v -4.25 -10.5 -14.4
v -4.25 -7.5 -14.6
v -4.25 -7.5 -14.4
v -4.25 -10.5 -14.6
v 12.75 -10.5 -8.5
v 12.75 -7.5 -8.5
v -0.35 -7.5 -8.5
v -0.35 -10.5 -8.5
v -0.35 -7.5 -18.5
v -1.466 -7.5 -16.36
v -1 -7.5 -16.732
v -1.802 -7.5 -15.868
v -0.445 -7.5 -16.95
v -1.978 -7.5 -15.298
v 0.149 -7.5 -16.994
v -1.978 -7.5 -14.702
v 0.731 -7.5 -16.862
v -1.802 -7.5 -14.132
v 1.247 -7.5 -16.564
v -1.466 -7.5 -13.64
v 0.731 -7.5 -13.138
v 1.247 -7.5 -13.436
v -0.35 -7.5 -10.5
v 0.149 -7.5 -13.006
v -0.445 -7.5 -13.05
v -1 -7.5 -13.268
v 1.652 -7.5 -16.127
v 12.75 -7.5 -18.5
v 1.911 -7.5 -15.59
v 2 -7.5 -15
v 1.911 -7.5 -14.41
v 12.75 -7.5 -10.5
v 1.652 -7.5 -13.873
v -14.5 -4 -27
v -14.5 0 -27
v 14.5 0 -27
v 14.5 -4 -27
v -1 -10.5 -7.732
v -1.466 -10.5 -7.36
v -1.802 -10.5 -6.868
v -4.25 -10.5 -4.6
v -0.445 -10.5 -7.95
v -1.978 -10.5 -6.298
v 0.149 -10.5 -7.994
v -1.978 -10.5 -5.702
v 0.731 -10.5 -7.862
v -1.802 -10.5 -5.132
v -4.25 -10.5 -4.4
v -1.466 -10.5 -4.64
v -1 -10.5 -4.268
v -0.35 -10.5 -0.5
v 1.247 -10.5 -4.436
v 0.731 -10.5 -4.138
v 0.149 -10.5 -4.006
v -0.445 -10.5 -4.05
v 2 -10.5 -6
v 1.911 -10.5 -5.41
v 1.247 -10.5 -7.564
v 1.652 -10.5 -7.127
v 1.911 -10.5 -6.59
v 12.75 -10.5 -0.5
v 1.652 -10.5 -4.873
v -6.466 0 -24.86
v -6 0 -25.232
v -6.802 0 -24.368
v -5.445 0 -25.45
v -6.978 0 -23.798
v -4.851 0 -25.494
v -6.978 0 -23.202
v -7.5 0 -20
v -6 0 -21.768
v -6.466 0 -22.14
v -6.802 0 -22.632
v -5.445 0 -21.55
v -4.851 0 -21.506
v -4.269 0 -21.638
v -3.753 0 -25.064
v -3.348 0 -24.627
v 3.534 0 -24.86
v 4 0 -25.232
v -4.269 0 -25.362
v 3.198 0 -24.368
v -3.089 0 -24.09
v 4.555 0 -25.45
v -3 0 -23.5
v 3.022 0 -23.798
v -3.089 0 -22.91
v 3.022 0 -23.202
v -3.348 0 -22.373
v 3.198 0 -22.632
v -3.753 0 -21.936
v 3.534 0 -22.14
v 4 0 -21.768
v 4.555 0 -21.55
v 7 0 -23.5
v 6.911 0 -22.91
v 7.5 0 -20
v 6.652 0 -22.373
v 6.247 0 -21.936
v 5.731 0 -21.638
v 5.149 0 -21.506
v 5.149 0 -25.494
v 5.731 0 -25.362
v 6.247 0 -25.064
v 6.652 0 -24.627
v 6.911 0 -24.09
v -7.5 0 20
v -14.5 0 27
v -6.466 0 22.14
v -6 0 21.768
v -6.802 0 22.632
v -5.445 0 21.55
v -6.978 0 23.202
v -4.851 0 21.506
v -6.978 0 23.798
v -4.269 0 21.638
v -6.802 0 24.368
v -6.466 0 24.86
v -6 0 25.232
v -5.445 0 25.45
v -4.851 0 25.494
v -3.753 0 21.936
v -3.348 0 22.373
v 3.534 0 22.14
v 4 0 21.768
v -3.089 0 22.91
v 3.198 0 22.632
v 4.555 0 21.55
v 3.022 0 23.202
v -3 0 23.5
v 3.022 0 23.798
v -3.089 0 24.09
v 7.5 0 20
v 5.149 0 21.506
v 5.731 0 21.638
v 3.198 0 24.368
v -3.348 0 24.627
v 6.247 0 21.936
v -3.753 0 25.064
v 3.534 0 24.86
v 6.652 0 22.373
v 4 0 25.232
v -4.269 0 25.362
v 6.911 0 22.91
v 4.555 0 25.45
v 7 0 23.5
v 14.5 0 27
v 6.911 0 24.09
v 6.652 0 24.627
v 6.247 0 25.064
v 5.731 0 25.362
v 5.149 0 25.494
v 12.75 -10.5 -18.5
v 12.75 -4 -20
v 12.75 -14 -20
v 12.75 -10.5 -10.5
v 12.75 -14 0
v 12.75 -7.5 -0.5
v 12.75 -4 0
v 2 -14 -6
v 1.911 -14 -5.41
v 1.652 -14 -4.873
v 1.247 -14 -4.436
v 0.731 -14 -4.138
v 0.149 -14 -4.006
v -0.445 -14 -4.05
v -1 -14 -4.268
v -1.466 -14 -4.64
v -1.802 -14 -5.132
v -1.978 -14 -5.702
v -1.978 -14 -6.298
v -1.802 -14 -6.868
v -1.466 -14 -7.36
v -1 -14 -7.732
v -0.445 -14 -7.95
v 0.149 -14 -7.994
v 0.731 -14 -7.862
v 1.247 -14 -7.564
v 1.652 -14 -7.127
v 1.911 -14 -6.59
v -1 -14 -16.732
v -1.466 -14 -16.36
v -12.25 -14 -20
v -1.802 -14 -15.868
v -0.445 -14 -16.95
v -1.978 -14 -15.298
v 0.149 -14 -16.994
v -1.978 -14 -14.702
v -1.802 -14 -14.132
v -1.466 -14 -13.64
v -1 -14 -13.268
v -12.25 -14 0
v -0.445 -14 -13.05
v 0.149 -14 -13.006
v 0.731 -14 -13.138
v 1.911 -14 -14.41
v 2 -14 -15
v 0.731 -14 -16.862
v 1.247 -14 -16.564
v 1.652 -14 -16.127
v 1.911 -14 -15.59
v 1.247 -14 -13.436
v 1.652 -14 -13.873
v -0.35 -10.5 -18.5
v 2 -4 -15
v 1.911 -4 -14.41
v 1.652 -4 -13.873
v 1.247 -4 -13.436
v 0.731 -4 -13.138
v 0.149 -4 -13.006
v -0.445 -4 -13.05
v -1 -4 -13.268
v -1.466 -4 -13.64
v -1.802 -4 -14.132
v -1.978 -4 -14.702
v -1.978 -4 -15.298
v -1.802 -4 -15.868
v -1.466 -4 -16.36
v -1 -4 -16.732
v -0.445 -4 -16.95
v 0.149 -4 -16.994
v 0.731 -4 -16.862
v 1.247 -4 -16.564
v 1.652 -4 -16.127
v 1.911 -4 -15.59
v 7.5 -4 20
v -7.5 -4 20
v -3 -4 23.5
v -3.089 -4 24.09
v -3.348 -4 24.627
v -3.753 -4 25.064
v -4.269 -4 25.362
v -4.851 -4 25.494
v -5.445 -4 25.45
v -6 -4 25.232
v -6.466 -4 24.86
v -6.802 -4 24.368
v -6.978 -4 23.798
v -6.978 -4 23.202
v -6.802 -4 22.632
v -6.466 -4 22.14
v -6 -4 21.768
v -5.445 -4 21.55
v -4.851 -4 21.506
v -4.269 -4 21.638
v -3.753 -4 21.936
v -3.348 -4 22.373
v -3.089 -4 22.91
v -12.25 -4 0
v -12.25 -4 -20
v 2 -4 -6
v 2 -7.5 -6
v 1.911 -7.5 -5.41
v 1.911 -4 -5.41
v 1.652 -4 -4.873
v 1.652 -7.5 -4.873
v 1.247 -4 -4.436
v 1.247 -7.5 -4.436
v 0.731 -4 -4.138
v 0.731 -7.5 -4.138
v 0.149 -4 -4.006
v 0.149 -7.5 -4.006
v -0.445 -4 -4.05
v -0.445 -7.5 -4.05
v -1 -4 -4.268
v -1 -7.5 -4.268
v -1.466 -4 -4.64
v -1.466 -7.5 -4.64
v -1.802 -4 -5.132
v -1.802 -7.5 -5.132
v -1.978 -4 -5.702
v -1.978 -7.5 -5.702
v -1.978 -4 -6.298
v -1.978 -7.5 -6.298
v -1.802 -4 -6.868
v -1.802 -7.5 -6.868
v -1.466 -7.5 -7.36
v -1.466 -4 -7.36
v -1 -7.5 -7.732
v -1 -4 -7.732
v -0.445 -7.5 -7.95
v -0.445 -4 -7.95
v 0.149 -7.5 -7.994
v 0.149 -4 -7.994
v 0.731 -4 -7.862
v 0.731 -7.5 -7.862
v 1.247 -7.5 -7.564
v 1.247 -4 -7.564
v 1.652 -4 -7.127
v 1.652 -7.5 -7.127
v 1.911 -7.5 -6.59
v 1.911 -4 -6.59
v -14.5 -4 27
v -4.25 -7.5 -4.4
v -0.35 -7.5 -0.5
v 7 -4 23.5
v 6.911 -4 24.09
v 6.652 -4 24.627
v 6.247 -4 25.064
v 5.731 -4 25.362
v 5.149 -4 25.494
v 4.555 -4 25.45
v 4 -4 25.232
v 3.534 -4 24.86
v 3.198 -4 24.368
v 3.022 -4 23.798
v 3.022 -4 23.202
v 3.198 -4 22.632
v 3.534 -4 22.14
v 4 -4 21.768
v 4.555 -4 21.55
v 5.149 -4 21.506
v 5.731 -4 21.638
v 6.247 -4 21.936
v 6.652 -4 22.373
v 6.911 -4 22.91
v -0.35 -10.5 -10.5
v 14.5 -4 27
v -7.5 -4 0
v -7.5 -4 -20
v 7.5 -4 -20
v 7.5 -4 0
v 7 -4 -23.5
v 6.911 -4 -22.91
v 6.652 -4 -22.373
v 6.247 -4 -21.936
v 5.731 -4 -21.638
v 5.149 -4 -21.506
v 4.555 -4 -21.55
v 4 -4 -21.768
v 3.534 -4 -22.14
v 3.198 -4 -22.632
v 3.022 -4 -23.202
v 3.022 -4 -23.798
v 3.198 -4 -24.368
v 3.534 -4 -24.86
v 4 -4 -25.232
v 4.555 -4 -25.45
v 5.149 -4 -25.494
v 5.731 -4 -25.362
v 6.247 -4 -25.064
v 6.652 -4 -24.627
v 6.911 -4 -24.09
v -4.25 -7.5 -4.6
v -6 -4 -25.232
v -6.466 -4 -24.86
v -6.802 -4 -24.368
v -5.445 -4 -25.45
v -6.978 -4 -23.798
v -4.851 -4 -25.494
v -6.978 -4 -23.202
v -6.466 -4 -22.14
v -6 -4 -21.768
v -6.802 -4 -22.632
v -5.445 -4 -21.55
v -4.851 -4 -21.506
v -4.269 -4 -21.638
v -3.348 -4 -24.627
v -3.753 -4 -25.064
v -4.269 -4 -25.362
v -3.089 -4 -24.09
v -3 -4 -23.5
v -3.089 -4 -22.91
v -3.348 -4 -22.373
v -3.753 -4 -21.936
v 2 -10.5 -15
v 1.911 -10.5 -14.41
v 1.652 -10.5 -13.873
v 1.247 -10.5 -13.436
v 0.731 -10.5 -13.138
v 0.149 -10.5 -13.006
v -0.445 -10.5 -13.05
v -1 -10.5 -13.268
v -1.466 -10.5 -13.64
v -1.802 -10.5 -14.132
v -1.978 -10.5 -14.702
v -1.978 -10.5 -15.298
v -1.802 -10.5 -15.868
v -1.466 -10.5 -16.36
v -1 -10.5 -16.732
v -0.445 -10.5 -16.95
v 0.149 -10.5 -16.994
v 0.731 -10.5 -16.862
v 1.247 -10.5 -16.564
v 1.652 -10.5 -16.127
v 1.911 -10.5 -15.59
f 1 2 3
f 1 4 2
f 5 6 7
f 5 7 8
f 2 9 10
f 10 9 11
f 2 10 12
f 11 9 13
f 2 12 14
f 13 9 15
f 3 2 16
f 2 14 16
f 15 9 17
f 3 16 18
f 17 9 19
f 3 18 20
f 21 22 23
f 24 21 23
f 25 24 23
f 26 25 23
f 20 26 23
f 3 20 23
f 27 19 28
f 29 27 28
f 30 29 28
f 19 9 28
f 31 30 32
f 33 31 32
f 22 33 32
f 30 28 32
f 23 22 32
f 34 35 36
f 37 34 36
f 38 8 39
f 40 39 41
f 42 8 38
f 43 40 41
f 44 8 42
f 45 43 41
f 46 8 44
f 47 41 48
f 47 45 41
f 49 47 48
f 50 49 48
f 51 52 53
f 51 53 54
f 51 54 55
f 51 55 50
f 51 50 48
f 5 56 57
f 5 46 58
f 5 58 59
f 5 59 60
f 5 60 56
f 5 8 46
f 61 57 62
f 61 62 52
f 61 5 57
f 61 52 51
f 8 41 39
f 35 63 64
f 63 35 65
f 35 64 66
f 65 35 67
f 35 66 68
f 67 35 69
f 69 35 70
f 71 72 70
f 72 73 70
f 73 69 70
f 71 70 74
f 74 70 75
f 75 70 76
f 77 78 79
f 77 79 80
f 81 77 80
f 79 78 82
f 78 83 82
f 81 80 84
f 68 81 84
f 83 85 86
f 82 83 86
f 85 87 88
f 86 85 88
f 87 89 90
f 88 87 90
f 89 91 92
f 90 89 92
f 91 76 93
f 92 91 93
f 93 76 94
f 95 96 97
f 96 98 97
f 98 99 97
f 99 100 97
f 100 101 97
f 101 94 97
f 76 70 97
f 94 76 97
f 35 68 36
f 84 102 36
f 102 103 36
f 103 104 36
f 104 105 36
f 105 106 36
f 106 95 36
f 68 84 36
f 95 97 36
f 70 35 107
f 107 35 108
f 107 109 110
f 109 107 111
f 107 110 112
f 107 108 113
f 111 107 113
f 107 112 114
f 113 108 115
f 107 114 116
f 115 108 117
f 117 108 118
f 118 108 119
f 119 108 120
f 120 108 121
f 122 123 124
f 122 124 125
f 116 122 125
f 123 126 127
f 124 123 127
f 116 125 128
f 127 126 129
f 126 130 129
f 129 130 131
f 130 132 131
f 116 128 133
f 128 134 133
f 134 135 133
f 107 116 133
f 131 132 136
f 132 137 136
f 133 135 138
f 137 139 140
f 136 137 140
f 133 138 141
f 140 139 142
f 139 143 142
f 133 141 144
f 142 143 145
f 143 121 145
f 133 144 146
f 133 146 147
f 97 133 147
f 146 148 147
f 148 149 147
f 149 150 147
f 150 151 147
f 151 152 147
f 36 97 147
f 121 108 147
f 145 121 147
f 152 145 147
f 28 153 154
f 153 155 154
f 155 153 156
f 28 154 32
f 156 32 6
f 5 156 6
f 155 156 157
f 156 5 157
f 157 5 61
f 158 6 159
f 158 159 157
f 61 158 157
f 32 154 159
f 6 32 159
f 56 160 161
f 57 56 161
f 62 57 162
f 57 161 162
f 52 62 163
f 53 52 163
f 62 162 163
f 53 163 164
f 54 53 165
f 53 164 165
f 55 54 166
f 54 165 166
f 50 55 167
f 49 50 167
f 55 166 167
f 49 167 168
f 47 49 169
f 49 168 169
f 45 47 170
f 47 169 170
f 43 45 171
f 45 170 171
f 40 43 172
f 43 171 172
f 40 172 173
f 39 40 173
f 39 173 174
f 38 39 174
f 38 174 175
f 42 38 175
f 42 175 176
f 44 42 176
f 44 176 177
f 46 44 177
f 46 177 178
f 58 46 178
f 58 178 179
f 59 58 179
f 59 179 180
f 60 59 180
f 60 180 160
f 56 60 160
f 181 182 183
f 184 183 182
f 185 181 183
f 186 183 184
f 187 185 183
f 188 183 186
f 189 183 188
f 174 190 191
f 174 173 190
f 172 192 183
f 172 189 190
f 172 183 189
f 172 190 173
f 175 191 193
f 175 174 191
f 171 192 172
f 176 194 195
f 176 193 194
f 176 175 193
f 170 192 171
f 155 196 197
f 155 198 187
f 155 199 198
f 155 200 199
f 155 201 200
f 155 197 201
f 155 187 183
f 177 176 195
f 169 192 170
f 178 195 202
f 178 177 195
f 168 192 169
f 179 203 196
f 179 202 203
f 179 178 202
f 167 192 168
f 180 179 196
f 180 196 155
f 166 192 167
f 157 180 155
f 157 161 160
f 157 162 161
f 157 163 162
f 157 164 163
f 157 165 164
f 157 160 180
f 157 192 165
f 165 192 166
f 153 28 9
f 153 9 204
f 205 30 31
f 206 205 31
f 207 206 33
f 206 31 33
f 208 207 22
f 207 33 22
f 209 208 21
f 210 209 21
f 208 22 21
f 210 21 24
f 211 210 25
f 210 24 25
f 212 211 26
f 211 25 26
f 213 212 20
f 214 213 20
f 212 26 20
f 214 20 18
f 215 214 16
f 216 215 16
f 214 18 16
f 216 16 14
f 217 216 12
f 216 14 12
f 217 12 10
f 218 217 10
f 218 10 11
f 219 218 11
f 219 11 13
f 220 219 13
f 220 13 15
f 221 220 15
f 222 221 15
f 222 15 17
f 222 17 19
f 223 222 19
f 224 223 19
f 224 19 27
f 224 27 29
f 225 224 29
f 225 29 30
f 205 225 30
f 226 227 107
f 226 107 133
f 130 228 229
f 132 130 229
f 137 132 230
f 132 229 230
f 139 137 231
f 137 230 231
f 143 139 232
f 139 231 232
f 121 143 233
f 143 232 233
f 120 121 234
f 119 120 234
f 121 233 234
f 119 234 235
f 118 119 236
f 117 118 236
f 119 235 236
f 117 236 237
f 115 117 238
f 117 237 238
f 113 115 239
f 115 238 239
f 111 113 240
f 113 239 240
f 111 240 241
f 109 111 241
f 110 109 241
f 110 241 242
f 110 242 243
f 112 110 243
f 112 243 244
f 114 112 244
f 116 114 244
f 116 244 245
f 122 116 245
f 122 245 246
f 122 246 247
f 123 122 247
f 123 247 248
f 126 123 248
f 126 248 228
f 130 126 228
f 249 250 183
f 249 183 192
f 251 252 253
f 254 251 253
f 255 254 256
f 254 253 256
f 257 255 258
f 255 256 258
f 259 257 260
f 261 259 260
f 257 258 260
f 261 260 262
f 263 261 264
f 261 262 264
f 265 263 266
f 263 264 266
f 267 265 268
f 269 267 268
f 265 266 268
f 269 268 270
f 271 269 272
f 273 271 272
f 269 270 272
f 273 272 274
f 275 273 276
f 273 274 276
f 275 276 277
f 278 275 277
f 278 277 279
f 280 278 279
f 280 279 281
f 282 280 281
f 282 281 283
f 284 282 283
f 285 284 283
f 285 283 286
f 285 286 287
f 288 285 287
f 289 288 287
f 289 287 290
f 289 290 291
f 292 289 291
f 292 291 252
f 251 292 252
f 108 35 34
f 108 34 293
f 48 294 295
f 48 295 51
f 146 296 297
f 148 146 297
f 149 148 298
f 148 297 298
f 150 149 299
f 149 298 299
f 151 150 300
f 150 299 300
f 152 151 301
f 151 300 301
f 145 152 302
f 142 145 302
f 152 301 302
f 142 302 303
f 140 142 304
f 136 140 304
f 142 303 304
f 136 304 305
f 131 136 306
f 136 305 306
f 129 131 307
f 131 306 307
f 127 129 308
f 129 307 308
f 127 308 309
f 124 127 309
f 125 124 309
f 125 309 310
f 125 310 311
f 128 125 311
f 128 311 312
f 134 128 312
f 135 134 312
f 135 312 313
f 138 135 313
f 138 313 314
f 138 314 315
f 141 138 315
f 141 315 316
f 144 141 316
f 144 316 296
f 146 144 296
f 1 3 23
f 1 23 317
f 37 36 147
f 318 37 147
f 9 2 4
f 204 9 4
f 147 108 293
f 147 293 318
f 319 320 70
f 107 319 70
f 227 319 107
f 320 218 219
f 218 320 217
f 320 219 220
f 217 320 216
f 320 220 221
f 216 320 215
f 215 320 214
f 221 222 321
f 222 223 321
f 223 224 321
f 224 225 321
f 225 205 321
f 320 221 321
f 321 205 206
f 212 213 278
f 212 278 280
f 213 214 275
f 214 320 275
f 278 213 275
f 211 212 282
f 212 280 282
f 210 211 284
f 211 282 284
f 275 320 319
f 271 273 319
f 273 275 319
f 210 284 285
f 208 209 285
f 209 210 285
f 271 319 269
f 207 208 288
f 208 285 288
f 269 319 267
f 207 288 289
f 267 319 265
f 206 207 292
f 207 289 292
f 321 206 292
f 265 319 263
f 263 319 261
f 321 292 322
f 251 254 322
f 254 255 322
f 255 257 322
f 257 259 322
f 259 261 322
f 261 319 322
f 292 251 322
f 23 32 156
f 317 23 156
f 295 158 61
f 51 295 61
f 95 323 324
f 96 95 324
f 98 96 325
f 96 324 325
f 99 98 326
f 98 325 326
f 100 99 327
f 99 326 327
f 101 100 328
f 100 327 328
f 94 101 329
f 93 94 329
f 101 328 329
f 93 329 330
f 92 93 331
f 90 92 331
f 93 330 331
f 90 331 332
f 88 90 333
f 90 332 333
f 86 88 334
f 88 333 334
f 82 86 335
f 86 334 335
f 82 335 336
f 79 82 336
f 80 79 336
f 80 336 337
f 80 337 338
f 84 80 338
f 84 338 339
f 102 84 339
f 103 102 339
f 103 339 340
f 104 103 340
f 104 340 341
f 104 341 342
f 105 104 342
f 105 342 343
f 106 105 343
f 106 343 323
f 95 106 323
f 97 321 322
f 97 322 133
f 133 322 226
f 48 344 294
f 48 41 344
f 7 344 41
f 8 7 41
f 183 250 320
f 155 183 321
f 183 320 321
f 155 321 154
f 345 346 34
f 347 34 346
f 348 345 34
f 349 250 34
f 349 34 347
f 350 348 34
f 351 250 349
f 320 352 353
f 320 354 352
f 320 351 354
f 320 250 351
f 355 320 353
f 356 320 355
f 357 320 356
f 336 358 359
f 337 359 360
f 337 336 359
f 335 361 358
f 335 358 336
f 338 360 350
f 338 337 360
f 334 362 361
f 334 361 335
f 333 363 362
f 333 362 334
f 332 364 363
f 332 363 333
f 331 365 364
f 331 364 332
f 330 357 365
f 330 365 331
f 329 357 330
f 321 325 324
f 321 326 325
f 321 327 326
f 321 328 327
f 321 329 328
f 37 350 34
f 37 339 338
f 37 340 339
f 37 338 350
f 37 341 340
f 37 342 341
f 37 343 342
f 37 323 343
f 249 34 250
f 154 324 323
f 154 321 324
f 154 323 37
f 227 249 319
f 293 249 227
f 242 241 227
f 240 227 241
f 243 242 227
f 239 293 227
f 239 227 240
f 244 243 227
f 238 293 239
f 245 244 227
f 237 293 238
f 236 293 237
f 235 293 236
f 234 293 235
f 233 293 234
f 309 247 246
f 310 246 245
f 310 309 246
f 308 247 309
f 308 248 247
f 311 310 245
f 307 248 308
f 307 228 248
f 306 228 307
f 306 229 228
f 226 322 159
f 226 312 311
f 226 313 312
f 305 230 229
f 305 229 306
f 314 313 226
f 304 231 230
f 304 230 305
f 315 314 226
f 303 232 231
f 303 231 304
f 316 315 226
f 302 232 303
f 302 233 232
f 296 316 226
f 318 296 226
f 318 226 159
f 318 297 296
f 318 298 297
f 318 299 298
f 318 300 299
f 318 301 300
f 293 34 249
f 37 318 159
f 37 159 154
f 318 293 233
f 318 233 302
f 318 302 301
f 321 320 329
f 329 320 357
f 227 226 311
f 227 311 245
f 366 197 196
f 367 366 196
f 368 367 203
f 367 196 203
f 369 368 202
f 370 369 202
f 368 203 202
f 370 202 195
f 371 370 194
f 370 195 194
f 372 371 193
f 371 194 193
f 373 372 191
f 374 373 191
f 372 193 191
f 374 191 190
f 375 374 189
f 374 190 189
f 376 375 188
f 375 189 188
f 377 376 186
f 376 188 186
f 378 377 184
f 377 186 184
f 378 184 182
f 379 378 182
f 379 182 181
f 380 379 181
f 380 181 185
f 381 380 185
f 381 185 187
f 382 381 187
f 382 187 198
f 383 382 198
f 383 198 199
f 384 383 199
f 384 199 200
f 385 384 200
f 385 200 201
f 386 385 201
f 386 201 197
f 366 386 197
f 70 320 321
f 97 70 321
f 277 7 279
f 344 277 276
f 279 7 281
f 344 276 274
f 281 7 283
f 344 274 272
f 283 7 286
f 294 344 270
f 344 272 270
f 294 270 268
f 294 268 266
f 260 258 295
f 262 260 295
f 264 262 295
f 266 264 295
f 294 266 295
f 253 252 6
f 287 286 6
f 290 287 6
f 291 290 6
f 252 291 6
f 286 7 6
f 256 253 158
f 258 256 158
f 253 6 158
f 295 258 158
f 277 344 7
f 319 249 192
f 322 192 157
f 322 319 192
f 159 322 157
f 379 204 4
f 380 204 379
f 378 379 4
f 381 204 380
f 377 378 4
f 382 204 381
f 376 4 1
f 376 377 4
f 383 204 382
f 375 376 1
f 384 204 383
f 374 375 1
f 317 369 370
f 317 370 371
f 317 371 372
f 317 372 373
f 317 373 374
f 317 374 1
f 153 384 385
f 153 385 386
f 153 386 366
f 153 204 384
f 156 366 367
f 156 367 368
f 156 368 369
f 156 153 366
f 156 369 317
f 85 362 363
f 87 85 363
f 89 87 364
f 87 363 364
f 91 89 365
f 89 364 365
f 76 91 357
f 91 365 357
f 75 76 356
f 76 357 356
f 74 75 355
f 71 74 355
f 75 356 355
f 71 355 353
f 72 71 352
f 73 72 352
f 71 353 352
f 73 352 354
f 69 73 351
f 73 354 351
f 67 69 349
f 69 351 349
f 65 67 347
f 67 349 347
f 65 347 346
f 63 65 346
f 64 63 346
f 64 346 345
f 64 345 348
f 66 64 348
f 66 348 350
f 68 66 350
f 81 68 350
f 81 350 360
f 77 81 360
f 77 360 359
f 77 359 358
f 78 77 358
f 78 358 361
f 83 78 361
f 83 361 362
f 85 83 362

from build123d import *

# Parameters (mm, degrees)
SKETCH_W        = 29
SKETCH_H        = 54
PAD_DEPTH       = 4
SKETCH001_W     = 15
SKETCH001_H     = 40
POCKET_DEPTH    = 5
SKETCH002_R     = 2
POCKET001_DEPTH = 4.001
SKETCH003_W     = 25
SKETCH003_H     = 20
PAD001_DEPTH    = 10
SKETCH004_R     = 2
POCKET002_DEPTH = 14.001
SKETCH006_W     = 8
SKETCH006_H     = 3
POCKET003_DEPTH = 17
CHAMFER_SIZE    = 3.9


with BuildPart() as part:
    # Sketch → Pad (new body)
    with BuildSketch(Plane.XZ):
        Rectangle(SKETCH_W, SKETCH_H)
    extrude(amount=PAD_DEPTH)

    # Sketch001 (on Face6 of Pad) → Pocket (cut)
    with BuildSketch(Plane.XZ.offset(4)):
        Rectangle(SKETCH001_W, SKETCH001_H)
    extrude(amount=-POCKET_DEPTH, mode=Mode.SUBTRACT)

    # Sketch002 (on Face5 of Pocket) → Pocket001 (cut, through all)
    with BuildSketch(Plane.XZ.offset(4)):
        with Locations((-5, 23.5)):
            Circle(SKETCH002_R)
        with Locations((5, 23.5)):
            Circle(SKETCH002_R)
        with Locations((-5, -23.5)):
            Circle(SKETCH002_R)
        with Locations((5, -23.5)):
            Circle(SKETCH002_R)
    extrude(amount=-POCKET001_DEPTH, mode=Mode.SUBTRACT)

    # Sketch003 (on Face5 of Pocket001) → Pad001 (join)
    with BuildSketch(Plane.XZ.offset(4)):
        with Locations((0.25, -10)):
            Rectangle(SKETCH003_W, SKETCH003_H)
    extrude(amount=PAD001_DEPTH)

    # Sketch004 (on Face20 of Pad001) → Pocket002 (cut, through all)
    with BuildSketch(Plane.XZ.offset(14)):
        with Locations((0, -6)):
            Circle(SKETCH004_R)
        with Locations((0, -15)):
            Circle(SKETCH004_R)
    extrude(amount=-POCKET002_DEPTH, mode=Mode.SUBTRACT)

    # Sketch006 (on Face16 of Pocket002) → Pocket003 (cut)
    with BuildSketch(Plane(origin=(12.75, 0, 0), x_dir=(0, 0, 1), z_dir=(1, 0, 0))):
        with Locations((-14.5, 9)):
            Rectangle(SKETCH006_W, SKETCH006_H)
        with Locations((-4.5, 9)):
            Rectangle(SKETCH006_W, SKETCH006_H)
    extrude(amount=-POCKET003_DEPTH, mode=Mode.SUBTRACT)

    # Chamfer
    chamfer_edges = [part.edges().sort_by_distance(p)[0] for p in [
        (-4.25, -9, -18.5),
        (-4.25, -9, -0.5),
        (-4.25, -9, -8.5),
        (-4.25, -9, -10.5),
    ]]
    chamfer(chamfer_edges, length=CHAMFER_SIZE)


solid = part.part
